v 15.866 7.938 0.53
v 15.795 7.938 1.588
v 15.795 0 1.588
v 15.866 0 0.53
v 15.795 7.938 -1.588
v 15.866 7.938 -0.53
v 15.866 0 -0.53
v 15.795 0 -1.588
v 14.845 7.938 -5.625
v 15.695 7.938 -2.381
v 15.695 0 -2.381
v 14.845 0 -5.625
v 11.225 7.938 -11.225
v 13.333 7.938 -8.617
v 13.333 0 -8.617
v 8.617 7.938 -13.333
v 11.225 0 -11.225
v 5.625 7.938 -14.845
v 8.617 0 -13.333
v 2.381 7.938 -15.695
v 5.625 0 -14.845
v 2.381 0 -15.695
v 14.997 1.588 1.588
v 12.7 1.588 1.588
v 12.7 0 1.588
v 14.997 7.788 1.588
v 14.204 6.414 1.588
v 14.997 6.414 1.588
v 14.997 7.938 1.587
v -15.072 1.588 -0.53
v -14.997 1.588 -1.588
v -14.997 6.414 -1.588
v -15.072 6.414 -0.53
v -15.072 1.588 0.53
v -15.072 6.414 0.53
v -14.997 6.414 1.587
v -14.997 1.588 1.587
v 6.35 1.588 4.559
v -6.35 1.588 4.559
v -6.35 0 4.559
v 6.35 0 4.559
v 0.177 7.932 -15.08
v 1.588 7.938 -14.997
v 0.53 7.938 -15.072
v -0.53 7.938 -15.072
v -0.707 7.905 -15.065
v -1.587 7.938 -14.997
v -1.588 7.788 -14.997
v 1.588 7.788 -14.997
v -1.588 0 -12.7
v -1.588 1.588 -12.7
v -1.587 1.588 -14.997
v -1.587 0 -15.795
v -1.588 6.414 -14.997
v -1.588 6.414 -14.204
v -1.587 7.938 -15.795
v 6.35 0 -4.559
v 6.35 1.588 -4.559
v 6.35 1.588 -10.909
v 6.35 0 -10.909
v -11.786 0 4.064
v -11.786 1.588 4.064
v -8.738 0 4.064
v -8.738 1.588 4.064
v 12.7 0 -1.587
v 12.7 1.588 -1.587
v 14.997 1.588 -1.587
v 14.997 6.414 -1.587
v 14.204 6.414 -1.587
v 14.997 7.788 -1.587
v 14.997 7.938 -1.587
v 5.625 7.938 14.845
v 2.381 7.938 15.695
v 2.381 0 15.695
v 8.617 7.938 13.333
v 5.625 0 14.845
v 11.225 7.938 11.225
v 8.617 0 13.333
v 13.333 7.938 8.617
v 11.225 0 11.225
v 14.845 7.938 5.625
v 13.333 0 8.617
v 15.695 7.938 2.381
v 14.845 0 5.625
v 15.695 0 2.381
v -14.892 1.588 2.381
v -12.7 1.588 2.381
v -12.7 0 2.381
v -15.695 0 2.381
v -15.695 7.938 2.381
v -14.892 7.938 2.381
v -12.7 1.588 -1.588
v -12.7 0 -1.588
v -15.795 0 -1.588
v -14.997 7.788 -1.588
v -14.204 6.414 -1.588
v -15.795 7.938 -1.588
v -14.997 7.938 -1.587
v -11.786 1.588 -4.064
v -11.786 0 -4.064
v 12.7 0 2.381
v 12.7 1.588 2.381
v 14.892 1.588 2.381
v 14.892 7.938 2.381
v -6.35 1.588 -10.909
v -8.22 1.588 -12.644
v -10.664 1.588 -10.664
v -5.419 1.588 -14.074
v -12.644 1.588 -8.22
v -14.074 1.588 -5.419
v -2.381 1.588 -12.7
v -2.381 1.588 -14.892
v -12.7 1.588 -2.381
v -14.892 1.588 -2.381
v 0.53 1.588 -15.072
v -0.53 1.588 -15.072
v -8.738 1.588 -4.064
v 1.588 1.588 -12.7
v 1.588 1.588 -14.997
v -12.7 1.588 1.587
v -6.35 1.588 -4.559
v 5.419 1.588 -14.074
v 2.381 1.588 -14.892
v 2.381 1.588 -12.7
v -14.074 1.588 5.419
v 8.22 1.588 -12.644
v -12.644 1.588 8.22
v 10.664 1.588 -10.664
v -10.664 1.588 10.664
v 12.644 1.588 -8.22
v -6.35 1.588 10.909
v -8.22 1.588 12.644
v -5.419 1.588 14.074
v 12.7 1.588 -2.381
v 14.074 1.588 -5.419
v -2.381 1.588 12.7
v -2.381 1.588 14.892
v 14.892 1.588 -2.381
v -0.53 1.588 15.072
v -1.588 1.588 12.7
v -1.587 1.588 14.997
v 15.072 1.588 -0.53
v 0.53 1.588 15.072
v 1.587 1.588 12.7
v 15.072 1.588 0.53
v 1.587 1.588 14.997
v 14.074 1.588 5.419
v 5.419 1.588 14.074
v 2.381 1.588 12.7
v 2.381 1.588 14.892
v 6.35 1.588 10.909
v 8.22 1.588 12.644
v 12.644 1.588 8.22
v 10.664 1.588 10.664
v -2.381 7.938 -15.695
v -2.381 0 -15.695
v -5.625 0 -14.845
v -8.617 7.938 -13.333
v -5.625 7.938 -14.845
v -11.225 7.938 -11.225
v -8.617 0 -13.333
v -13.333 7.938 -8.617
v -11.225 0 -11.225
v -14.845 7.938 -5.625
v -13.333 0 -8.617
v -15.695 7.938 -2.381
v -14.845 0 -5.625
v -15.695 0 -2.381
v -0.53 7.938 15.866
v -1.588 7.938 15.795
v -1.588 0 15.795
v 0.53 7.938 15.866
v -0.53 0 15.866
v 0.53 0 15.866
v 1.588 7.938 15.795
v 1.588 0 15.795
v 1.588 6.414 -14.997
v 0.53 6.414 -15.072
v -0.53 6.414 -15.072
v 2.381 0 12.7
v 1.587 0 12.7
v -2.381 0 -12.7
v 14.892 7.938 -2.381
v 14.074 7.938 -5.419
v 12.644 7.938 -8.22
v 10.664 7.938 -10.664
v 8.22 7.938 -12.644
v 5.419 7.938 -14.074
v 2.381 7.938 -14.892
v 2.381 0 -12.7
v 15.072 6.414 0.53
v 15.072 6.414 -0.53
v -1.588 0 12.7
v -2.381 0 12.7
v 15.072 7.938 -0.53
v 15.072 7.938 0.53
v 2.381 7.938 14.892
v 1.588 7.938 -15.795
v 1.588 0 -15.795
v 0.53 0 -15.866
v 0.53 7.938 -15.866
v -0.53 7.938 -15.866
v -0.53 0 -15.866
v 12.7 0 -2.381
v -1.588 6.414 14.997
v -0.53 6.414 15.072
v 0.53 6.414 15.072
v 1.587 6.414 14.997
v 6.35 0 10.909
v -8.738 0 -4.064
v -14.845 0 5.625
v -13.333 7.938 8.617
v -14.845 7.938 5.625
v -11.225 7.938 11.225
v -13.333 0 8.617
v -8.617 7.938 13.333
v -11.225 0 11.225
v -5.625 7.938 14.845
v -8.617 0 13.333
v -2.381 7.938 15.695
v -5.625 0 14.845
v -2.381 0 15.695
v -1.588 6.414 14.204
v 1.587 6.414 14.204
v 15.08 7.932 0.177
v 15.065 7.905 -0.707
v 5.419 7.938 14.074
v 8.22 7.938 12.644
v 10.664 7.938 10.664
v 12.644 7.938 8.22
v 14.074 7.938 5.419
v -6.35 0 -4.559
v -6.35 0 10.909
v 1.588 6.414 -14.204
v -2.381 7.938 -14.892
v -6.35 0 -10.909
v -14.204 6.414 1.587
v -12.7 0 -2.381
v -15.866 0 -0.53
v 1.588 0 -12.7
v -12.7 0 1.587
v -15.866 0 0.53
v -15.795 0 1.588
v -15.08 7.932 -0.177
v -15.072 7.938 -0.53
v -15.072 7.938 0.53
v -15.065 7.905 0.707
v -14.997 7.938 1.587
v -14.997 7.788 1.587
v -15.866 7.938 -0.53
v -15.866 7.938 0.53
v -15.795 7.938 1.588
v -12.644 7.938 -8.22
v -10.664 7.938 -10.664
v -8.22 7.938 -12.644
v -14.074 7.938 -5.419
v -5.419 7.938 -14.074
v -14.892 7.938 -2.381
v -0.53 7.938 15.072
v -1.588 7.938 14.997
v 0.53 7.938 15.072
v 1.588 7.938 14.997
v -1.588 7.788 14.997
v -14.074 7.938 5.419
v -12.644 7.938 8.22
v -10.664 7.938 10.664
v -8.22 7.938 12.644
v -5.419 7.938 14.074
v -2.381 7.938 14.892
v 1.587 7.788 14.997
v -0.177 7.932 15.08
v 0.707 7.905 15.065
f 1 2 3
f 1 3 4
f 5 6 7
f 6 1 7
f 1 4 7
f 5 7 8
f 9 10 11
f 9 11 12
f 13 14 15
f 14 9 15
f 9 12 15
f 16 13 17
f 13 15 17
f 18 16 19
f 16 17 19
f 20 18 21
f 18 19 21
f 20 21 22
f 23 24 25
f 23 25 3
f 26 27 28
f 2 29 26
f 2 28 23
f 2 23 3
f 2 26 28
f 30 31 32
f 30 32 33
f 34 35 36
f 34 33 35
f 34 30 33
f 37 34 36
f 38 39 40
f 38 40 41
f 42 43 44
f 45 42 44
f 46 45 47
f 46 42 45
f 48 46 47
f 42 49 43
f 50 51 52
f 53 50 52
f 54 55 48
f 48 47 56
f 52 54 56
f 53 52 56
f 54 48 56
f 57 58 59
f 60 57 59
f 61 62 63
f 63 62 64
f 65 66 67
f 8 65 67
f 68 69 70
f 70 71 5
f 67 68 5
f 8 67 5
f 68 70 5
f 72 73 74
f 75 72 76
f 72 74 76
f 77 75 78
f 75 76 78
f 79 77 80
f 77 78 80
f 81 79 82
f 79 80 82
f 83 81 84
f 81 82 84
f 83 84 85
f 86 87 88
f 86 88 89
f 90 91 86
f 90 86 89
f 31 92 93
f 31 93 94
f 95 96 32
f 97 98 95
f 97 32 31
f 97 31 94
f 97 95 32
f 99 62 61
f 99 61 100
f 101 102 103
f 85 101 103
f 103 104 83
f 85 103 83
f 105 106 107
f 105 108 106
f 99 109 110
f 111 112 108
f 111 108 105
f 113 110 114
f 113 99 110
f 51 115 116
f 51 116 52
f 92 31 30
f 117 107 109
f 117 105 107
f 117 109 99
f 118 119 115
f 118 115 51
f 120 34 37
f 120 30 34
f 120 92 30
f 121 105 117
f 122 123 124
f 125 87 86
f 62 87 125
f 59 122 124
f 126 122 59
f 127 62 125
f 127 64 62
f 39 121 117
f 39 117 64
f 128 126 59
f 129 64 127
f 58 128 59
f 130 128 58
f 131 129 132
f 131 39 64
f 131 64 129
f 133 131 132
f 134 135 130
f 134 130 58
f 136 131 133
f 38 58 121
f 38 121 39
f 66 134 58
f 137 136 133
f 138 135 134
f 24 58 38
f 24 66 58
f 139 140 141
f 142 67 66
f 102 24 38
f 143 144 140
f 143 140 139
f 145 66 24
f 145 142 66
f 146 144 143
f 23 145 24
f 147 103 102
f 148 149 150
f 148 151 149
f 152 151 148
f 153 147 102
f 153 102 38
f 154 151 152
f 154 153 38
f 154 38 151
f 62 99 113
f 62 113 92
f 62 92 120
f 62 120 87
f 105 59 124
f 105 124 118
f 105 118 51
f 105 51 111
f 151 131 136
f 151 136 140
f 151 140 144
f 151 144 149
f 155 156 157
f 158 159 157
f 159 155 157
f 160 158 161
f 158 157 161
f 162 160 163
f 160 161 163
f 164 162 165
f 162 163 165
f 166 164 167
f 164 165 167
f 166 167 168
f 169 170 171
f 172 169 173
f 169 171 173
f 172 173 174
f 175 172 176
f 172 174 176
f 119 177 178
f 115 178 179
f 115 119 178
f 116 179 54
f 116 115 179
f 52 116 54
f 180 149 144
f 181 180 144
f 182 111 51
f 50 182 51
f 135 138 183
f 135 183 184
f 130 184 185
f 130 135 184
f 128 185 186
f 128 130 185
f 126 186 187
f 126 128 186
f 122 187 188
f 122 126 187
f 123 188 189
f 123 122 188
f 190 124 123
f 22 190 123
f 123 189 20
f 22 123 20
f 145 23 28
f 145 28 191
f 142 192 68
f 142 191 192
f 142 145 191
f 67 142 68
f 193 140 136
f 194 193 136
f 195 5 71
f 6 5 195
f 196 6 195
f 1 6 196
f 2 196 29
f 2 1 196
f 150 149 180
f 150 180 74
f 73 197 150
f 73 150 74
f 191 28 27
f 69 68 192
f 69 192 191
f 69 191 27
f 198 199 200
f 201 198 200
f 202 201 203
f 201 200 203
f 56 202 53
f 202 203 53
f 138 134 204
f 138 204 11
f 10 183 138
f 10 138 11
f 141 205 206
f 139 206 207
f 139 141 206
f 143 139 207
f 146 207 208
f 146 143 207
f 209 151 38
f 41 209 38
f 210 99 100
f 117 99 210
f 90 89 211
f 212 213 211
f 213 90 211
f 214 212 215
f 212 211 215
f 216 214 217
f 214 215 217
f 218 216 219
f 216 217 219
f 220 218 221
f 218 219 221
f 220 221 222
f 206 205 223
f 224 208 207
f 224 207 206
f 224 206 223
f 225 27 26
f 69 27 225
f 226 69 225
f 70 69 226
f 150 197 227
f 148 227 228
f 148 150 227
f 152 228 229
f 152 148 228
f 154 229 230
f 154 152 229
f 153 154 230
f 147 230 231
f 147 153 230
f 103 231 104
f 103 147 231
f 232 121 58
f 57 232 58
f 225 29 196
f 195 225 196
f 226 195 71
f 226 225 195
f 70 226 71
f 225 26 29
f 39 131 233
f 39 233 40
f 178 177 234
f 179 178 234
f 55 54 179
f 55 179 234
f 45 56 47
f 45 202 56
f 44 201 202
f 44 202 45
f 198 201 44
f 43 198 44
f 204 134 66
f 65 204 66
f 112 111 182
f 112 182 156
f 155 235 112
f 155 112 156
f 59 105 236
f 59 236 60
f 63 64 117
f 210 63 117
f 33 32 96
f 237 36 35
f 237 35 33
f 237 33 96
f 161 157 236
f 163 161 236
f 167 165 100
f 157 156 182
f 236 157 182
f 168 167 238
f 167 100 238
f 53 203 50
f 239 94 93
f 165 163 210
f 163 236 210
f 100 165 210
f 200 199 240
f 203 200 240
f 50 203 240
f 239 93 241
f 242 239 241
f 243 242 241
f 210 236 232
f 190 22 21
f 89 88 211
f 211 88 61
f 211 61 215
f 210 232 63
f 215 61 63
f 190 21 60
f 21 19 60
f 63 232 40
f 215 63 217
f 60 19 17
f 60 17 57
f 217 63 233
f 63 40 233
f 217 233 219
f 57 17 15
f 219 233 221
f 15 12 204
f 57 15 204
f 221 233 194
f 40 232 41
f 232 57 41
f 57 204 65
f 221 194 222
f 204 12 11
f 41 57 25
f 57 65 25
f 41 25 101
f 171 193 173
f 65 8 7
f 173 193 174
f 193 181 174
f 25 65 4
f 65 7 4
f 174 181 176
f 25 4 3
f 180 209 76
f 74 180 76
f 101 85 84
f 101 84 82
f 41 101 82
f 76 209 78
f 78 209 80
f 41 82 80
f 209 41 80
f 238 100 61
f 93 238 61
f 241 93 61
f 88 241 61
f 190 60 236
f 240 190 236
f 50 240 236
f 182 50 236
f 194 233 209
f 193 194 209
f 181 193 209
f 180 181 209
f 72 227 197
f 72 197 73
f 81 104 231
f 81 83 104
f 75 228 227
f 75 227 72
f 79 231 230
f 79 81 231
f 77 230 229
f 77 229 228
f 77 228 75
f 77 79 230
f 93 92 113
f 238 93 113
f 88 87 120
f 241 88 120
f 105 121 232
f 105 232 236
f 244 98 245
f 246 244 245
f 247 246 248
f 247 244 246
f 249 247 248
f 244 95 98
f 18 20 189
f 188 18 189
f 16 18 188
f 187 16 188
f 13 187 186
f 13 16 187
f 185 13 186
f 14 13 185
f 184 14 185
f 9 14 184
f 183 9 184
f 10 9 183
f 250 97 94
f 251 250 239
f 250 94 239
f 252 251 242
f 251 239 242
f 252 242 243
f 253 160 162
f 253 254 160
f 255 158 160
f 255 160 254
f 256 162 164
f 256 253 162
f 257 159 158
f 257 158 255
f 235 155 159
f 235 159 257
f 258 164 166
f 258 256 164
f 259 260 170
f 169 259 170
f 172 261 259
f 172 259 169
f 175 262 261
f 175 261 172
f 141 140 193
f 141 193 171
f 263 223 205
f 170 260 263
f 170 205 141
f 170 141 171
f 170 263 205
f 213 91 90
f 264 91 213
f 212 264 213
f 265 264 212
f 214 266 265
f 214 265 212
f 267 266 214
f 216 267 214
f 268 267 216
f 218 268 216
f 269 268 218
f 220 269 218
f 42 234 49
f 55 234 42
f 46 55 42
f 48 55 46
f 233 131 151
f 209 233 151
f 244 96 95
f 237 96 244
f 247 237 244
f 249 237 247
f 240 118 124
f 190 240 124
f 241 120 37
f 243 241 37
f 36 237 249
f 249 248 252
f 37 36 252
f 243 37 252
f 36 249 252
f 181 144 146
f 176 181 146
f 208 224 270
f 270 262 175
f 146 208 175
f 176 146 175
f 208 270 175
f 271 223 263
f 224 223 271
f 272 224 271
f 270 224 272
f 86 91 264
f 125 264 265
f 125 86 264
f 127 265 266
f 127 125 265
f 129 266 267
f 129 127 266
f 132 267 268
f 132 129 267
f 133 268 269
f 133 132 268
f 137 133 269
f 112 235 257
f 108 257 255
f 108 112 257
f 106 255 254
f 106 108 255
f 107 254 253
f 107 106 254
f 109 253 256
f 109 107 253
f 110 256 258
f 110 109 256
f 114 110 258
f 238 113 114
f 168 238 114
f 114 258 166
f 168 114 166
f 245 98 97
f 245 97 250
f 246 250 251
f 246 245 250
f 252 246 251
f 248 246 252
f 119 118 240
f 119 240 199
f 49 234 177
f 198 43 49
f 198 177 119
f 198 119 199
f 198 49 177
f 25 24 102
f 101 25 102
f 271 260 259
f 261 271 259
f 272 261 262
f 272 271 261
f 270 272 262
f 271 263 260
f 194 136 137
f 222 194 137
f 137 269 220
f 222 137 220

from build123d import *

# Parameters (mm, degrees)
SKETCH1_R           = 15.875
BOSS_EXTRUDE1_DEPTH = 1.5875
BOSS_EXTRUDE2_START = 1.5875
SKETCH1_3_R         = 15.875
SKETCH1_3_R_2       = 15.08125
BOSS_EXTRUDE2_DEPTH = 6.35
CUT_EXTRUDE1_REACH  = 25.812
SKETCH3_W           = 0.79375
SKETCH3_H           = 3.175
BOSS_EXTRUDE3_DEPTH = 1.5875
CIRPATTERN2_COUNT   = 4
SKETCH5_W           = 12.7
SKETCH5_H           = 6.35
SKETCH5_W_2         = 3.048
SKETCH5_H_2         = 8.128
CUT_EXTRUDE2_DEPTH  = 24.3313898


with BuildPart() as part:
    # Sketch1 → Boss-Extrude1 (new body)
    with BuildSketch(Plane(origin=(0, 0, 0), x_dir=(1, 0, 0), z_dir=(0, 1, 0))):
        with Locations(Location((0, 0, 0), (0, 0, 270))):
            Circle(SKETCH1_R)
    extrude(amount=BOSS_EXTRUDE1_DEPTH)

    # Sketch1<3> → Boss-Extrude2 (add)
    with BuildSketch(Plane(origin=(0, 0, 0), x_dir=(1, 0, 0), z_dir=(0, 1, 0)).offset(BOSS_EXTRUDE2_START)):
        with Locations(Location((0, 0, 0), (0, 0, 270))):
            Circle(SKETCH1_3_R)
        with Locations(Location((0, 0, 0), (0, 0, 270))):
            Circle(SKETCH1_3_R_2, mode=Mode.SUBTRACT)
    extrude(amount=BOSS_EXTRUDE2_DEPTH)

    # Cut-Extrude1: up to this face of the body (flat: up to its plane)
    cut_extrude1_end = Plane(part.part.faces().sort_by_distance((0, 0, 0))[0])
    # Sketch3 → Cut-Extrude1 (cut, up to the picked face)
    with BuildSketch(Plane(origin=(0, 7.9375, 0), x_dir=(1, 0, 0), z_dir=(0, 1, 0)), mode=Mode.PRIVATE) as cut_extrude1_sk1:
        with Locations((1.984375, 14.2875)):
            Rectangle(SKETCH3_W, SKETCH3_H)
    cut_extrude1_tool1 = split(extrude(cut_extrude1_sk1.sketch, amount=-CUT_EXTRUDE1_REACH, mode=Mode.PRIVATE), bisect_by=cut_extrude1_end, keep=Keep.BOTH, mode=Mode.PRIVATE)
    # Sketch3 → Cut-Extrude1 (cut, up to the picked face)
    with BuildSketch(Plane(origin=(0, 7.9375, 0), x_dir=(1, 0, 0), z_dir=(0, 1, 0)), mode=Mode.PRIVATE) as cut_extrude1_sk2:
        with Locations((-1.984375, 14.2875)):
            Rectangle(SKETCH3_W, SKETCH3_H)
    cut_extrude1_tool2 = split(extrude(cut_extrude1_sk2.sketch, amount=-CUT_EXTRUDE1_REACH, mode=Mode.PRIVATE), bisect_by=cut_extrude1_end, keep=Keep.BOTH, mode=Mode.PRIVATE)
    cut_extrude1_1 = cut_extrude1_tool1.solids().sort_by(Axis((1.984375, 7.9375, -14.2875), (0, -1, 0)))[0]
    add(cut_extrude1_1, mode=Mode.SUBTRACT)
    cut_extrude1_2 = cut_extrude1_tool2.solids().sort_by(Axis((-1.984375, 7.9375, -14.2875), (0, -1, 0)))[0]
    add(cut_extrude1_2, mode=Mode.SUBTRACT)
    cut_extrude1 = cut_extrude1_1 + cut_extrude1_2  # Cut-Extrude1 as one shape, for the pattern or mirror that repeats it

    # Sketch4 → Boss-Extrude3 (add, symmetric)
    with BuildSketch(Plane.ZY):
        Polygon((-15.795425564, 7.9375), (-15.795425564, 6.4135), (-14.203714629, 6.4135), (-15.08359644, 7.9375), align=None)
    boss_extrude3 = extrude(amount=BOSS_EXTRUDE3_DEPTH, both=True)

    # CirPattern2: Cut-Extrude1, Boss-Extrude3 ×4 about axis
    cirpattern2_axis = Axis((0, 0, 0), (0, 1, 0))
    add([cut_extrude1.rotate(cirpattern2_axis, i * 360 / CIRPATTERN2_COUNT) for i in range(1, CIRPATTERN2_COUNT)], mode=Mode.SUBTRACT)
    add([boss_extrude3.rotate(cirpattern2_axis, i * 360 / CIRPATTERN2_COUNT) for i in range(1, CIRPATTERN2_COUNT)])

    # Sketch5 → Cut-Extrude2 (cut, through all)
    with BuildSketch(Plane(origin=(0, 1.5875, 0), x_dir=(1, 0, 0), z_dir=(0, 1, 0))):
        with Locations((0, 7.7343)):
            Rectangle(SKETCH5_W, SKETCH5_H)
        with Locations((0, -7.7343)):
            Rectangle(SKETCH5_W, SKETCH5_H)
        with Locations((-10.2616, 0)):
            Rectangle(SKETCH5_W_2, SKETCH5_H_2)
    extrude(amount=-CUT_EXTRUDE2_DEPTH, mode=Mode.SUBTRACT)


solid = part.part
